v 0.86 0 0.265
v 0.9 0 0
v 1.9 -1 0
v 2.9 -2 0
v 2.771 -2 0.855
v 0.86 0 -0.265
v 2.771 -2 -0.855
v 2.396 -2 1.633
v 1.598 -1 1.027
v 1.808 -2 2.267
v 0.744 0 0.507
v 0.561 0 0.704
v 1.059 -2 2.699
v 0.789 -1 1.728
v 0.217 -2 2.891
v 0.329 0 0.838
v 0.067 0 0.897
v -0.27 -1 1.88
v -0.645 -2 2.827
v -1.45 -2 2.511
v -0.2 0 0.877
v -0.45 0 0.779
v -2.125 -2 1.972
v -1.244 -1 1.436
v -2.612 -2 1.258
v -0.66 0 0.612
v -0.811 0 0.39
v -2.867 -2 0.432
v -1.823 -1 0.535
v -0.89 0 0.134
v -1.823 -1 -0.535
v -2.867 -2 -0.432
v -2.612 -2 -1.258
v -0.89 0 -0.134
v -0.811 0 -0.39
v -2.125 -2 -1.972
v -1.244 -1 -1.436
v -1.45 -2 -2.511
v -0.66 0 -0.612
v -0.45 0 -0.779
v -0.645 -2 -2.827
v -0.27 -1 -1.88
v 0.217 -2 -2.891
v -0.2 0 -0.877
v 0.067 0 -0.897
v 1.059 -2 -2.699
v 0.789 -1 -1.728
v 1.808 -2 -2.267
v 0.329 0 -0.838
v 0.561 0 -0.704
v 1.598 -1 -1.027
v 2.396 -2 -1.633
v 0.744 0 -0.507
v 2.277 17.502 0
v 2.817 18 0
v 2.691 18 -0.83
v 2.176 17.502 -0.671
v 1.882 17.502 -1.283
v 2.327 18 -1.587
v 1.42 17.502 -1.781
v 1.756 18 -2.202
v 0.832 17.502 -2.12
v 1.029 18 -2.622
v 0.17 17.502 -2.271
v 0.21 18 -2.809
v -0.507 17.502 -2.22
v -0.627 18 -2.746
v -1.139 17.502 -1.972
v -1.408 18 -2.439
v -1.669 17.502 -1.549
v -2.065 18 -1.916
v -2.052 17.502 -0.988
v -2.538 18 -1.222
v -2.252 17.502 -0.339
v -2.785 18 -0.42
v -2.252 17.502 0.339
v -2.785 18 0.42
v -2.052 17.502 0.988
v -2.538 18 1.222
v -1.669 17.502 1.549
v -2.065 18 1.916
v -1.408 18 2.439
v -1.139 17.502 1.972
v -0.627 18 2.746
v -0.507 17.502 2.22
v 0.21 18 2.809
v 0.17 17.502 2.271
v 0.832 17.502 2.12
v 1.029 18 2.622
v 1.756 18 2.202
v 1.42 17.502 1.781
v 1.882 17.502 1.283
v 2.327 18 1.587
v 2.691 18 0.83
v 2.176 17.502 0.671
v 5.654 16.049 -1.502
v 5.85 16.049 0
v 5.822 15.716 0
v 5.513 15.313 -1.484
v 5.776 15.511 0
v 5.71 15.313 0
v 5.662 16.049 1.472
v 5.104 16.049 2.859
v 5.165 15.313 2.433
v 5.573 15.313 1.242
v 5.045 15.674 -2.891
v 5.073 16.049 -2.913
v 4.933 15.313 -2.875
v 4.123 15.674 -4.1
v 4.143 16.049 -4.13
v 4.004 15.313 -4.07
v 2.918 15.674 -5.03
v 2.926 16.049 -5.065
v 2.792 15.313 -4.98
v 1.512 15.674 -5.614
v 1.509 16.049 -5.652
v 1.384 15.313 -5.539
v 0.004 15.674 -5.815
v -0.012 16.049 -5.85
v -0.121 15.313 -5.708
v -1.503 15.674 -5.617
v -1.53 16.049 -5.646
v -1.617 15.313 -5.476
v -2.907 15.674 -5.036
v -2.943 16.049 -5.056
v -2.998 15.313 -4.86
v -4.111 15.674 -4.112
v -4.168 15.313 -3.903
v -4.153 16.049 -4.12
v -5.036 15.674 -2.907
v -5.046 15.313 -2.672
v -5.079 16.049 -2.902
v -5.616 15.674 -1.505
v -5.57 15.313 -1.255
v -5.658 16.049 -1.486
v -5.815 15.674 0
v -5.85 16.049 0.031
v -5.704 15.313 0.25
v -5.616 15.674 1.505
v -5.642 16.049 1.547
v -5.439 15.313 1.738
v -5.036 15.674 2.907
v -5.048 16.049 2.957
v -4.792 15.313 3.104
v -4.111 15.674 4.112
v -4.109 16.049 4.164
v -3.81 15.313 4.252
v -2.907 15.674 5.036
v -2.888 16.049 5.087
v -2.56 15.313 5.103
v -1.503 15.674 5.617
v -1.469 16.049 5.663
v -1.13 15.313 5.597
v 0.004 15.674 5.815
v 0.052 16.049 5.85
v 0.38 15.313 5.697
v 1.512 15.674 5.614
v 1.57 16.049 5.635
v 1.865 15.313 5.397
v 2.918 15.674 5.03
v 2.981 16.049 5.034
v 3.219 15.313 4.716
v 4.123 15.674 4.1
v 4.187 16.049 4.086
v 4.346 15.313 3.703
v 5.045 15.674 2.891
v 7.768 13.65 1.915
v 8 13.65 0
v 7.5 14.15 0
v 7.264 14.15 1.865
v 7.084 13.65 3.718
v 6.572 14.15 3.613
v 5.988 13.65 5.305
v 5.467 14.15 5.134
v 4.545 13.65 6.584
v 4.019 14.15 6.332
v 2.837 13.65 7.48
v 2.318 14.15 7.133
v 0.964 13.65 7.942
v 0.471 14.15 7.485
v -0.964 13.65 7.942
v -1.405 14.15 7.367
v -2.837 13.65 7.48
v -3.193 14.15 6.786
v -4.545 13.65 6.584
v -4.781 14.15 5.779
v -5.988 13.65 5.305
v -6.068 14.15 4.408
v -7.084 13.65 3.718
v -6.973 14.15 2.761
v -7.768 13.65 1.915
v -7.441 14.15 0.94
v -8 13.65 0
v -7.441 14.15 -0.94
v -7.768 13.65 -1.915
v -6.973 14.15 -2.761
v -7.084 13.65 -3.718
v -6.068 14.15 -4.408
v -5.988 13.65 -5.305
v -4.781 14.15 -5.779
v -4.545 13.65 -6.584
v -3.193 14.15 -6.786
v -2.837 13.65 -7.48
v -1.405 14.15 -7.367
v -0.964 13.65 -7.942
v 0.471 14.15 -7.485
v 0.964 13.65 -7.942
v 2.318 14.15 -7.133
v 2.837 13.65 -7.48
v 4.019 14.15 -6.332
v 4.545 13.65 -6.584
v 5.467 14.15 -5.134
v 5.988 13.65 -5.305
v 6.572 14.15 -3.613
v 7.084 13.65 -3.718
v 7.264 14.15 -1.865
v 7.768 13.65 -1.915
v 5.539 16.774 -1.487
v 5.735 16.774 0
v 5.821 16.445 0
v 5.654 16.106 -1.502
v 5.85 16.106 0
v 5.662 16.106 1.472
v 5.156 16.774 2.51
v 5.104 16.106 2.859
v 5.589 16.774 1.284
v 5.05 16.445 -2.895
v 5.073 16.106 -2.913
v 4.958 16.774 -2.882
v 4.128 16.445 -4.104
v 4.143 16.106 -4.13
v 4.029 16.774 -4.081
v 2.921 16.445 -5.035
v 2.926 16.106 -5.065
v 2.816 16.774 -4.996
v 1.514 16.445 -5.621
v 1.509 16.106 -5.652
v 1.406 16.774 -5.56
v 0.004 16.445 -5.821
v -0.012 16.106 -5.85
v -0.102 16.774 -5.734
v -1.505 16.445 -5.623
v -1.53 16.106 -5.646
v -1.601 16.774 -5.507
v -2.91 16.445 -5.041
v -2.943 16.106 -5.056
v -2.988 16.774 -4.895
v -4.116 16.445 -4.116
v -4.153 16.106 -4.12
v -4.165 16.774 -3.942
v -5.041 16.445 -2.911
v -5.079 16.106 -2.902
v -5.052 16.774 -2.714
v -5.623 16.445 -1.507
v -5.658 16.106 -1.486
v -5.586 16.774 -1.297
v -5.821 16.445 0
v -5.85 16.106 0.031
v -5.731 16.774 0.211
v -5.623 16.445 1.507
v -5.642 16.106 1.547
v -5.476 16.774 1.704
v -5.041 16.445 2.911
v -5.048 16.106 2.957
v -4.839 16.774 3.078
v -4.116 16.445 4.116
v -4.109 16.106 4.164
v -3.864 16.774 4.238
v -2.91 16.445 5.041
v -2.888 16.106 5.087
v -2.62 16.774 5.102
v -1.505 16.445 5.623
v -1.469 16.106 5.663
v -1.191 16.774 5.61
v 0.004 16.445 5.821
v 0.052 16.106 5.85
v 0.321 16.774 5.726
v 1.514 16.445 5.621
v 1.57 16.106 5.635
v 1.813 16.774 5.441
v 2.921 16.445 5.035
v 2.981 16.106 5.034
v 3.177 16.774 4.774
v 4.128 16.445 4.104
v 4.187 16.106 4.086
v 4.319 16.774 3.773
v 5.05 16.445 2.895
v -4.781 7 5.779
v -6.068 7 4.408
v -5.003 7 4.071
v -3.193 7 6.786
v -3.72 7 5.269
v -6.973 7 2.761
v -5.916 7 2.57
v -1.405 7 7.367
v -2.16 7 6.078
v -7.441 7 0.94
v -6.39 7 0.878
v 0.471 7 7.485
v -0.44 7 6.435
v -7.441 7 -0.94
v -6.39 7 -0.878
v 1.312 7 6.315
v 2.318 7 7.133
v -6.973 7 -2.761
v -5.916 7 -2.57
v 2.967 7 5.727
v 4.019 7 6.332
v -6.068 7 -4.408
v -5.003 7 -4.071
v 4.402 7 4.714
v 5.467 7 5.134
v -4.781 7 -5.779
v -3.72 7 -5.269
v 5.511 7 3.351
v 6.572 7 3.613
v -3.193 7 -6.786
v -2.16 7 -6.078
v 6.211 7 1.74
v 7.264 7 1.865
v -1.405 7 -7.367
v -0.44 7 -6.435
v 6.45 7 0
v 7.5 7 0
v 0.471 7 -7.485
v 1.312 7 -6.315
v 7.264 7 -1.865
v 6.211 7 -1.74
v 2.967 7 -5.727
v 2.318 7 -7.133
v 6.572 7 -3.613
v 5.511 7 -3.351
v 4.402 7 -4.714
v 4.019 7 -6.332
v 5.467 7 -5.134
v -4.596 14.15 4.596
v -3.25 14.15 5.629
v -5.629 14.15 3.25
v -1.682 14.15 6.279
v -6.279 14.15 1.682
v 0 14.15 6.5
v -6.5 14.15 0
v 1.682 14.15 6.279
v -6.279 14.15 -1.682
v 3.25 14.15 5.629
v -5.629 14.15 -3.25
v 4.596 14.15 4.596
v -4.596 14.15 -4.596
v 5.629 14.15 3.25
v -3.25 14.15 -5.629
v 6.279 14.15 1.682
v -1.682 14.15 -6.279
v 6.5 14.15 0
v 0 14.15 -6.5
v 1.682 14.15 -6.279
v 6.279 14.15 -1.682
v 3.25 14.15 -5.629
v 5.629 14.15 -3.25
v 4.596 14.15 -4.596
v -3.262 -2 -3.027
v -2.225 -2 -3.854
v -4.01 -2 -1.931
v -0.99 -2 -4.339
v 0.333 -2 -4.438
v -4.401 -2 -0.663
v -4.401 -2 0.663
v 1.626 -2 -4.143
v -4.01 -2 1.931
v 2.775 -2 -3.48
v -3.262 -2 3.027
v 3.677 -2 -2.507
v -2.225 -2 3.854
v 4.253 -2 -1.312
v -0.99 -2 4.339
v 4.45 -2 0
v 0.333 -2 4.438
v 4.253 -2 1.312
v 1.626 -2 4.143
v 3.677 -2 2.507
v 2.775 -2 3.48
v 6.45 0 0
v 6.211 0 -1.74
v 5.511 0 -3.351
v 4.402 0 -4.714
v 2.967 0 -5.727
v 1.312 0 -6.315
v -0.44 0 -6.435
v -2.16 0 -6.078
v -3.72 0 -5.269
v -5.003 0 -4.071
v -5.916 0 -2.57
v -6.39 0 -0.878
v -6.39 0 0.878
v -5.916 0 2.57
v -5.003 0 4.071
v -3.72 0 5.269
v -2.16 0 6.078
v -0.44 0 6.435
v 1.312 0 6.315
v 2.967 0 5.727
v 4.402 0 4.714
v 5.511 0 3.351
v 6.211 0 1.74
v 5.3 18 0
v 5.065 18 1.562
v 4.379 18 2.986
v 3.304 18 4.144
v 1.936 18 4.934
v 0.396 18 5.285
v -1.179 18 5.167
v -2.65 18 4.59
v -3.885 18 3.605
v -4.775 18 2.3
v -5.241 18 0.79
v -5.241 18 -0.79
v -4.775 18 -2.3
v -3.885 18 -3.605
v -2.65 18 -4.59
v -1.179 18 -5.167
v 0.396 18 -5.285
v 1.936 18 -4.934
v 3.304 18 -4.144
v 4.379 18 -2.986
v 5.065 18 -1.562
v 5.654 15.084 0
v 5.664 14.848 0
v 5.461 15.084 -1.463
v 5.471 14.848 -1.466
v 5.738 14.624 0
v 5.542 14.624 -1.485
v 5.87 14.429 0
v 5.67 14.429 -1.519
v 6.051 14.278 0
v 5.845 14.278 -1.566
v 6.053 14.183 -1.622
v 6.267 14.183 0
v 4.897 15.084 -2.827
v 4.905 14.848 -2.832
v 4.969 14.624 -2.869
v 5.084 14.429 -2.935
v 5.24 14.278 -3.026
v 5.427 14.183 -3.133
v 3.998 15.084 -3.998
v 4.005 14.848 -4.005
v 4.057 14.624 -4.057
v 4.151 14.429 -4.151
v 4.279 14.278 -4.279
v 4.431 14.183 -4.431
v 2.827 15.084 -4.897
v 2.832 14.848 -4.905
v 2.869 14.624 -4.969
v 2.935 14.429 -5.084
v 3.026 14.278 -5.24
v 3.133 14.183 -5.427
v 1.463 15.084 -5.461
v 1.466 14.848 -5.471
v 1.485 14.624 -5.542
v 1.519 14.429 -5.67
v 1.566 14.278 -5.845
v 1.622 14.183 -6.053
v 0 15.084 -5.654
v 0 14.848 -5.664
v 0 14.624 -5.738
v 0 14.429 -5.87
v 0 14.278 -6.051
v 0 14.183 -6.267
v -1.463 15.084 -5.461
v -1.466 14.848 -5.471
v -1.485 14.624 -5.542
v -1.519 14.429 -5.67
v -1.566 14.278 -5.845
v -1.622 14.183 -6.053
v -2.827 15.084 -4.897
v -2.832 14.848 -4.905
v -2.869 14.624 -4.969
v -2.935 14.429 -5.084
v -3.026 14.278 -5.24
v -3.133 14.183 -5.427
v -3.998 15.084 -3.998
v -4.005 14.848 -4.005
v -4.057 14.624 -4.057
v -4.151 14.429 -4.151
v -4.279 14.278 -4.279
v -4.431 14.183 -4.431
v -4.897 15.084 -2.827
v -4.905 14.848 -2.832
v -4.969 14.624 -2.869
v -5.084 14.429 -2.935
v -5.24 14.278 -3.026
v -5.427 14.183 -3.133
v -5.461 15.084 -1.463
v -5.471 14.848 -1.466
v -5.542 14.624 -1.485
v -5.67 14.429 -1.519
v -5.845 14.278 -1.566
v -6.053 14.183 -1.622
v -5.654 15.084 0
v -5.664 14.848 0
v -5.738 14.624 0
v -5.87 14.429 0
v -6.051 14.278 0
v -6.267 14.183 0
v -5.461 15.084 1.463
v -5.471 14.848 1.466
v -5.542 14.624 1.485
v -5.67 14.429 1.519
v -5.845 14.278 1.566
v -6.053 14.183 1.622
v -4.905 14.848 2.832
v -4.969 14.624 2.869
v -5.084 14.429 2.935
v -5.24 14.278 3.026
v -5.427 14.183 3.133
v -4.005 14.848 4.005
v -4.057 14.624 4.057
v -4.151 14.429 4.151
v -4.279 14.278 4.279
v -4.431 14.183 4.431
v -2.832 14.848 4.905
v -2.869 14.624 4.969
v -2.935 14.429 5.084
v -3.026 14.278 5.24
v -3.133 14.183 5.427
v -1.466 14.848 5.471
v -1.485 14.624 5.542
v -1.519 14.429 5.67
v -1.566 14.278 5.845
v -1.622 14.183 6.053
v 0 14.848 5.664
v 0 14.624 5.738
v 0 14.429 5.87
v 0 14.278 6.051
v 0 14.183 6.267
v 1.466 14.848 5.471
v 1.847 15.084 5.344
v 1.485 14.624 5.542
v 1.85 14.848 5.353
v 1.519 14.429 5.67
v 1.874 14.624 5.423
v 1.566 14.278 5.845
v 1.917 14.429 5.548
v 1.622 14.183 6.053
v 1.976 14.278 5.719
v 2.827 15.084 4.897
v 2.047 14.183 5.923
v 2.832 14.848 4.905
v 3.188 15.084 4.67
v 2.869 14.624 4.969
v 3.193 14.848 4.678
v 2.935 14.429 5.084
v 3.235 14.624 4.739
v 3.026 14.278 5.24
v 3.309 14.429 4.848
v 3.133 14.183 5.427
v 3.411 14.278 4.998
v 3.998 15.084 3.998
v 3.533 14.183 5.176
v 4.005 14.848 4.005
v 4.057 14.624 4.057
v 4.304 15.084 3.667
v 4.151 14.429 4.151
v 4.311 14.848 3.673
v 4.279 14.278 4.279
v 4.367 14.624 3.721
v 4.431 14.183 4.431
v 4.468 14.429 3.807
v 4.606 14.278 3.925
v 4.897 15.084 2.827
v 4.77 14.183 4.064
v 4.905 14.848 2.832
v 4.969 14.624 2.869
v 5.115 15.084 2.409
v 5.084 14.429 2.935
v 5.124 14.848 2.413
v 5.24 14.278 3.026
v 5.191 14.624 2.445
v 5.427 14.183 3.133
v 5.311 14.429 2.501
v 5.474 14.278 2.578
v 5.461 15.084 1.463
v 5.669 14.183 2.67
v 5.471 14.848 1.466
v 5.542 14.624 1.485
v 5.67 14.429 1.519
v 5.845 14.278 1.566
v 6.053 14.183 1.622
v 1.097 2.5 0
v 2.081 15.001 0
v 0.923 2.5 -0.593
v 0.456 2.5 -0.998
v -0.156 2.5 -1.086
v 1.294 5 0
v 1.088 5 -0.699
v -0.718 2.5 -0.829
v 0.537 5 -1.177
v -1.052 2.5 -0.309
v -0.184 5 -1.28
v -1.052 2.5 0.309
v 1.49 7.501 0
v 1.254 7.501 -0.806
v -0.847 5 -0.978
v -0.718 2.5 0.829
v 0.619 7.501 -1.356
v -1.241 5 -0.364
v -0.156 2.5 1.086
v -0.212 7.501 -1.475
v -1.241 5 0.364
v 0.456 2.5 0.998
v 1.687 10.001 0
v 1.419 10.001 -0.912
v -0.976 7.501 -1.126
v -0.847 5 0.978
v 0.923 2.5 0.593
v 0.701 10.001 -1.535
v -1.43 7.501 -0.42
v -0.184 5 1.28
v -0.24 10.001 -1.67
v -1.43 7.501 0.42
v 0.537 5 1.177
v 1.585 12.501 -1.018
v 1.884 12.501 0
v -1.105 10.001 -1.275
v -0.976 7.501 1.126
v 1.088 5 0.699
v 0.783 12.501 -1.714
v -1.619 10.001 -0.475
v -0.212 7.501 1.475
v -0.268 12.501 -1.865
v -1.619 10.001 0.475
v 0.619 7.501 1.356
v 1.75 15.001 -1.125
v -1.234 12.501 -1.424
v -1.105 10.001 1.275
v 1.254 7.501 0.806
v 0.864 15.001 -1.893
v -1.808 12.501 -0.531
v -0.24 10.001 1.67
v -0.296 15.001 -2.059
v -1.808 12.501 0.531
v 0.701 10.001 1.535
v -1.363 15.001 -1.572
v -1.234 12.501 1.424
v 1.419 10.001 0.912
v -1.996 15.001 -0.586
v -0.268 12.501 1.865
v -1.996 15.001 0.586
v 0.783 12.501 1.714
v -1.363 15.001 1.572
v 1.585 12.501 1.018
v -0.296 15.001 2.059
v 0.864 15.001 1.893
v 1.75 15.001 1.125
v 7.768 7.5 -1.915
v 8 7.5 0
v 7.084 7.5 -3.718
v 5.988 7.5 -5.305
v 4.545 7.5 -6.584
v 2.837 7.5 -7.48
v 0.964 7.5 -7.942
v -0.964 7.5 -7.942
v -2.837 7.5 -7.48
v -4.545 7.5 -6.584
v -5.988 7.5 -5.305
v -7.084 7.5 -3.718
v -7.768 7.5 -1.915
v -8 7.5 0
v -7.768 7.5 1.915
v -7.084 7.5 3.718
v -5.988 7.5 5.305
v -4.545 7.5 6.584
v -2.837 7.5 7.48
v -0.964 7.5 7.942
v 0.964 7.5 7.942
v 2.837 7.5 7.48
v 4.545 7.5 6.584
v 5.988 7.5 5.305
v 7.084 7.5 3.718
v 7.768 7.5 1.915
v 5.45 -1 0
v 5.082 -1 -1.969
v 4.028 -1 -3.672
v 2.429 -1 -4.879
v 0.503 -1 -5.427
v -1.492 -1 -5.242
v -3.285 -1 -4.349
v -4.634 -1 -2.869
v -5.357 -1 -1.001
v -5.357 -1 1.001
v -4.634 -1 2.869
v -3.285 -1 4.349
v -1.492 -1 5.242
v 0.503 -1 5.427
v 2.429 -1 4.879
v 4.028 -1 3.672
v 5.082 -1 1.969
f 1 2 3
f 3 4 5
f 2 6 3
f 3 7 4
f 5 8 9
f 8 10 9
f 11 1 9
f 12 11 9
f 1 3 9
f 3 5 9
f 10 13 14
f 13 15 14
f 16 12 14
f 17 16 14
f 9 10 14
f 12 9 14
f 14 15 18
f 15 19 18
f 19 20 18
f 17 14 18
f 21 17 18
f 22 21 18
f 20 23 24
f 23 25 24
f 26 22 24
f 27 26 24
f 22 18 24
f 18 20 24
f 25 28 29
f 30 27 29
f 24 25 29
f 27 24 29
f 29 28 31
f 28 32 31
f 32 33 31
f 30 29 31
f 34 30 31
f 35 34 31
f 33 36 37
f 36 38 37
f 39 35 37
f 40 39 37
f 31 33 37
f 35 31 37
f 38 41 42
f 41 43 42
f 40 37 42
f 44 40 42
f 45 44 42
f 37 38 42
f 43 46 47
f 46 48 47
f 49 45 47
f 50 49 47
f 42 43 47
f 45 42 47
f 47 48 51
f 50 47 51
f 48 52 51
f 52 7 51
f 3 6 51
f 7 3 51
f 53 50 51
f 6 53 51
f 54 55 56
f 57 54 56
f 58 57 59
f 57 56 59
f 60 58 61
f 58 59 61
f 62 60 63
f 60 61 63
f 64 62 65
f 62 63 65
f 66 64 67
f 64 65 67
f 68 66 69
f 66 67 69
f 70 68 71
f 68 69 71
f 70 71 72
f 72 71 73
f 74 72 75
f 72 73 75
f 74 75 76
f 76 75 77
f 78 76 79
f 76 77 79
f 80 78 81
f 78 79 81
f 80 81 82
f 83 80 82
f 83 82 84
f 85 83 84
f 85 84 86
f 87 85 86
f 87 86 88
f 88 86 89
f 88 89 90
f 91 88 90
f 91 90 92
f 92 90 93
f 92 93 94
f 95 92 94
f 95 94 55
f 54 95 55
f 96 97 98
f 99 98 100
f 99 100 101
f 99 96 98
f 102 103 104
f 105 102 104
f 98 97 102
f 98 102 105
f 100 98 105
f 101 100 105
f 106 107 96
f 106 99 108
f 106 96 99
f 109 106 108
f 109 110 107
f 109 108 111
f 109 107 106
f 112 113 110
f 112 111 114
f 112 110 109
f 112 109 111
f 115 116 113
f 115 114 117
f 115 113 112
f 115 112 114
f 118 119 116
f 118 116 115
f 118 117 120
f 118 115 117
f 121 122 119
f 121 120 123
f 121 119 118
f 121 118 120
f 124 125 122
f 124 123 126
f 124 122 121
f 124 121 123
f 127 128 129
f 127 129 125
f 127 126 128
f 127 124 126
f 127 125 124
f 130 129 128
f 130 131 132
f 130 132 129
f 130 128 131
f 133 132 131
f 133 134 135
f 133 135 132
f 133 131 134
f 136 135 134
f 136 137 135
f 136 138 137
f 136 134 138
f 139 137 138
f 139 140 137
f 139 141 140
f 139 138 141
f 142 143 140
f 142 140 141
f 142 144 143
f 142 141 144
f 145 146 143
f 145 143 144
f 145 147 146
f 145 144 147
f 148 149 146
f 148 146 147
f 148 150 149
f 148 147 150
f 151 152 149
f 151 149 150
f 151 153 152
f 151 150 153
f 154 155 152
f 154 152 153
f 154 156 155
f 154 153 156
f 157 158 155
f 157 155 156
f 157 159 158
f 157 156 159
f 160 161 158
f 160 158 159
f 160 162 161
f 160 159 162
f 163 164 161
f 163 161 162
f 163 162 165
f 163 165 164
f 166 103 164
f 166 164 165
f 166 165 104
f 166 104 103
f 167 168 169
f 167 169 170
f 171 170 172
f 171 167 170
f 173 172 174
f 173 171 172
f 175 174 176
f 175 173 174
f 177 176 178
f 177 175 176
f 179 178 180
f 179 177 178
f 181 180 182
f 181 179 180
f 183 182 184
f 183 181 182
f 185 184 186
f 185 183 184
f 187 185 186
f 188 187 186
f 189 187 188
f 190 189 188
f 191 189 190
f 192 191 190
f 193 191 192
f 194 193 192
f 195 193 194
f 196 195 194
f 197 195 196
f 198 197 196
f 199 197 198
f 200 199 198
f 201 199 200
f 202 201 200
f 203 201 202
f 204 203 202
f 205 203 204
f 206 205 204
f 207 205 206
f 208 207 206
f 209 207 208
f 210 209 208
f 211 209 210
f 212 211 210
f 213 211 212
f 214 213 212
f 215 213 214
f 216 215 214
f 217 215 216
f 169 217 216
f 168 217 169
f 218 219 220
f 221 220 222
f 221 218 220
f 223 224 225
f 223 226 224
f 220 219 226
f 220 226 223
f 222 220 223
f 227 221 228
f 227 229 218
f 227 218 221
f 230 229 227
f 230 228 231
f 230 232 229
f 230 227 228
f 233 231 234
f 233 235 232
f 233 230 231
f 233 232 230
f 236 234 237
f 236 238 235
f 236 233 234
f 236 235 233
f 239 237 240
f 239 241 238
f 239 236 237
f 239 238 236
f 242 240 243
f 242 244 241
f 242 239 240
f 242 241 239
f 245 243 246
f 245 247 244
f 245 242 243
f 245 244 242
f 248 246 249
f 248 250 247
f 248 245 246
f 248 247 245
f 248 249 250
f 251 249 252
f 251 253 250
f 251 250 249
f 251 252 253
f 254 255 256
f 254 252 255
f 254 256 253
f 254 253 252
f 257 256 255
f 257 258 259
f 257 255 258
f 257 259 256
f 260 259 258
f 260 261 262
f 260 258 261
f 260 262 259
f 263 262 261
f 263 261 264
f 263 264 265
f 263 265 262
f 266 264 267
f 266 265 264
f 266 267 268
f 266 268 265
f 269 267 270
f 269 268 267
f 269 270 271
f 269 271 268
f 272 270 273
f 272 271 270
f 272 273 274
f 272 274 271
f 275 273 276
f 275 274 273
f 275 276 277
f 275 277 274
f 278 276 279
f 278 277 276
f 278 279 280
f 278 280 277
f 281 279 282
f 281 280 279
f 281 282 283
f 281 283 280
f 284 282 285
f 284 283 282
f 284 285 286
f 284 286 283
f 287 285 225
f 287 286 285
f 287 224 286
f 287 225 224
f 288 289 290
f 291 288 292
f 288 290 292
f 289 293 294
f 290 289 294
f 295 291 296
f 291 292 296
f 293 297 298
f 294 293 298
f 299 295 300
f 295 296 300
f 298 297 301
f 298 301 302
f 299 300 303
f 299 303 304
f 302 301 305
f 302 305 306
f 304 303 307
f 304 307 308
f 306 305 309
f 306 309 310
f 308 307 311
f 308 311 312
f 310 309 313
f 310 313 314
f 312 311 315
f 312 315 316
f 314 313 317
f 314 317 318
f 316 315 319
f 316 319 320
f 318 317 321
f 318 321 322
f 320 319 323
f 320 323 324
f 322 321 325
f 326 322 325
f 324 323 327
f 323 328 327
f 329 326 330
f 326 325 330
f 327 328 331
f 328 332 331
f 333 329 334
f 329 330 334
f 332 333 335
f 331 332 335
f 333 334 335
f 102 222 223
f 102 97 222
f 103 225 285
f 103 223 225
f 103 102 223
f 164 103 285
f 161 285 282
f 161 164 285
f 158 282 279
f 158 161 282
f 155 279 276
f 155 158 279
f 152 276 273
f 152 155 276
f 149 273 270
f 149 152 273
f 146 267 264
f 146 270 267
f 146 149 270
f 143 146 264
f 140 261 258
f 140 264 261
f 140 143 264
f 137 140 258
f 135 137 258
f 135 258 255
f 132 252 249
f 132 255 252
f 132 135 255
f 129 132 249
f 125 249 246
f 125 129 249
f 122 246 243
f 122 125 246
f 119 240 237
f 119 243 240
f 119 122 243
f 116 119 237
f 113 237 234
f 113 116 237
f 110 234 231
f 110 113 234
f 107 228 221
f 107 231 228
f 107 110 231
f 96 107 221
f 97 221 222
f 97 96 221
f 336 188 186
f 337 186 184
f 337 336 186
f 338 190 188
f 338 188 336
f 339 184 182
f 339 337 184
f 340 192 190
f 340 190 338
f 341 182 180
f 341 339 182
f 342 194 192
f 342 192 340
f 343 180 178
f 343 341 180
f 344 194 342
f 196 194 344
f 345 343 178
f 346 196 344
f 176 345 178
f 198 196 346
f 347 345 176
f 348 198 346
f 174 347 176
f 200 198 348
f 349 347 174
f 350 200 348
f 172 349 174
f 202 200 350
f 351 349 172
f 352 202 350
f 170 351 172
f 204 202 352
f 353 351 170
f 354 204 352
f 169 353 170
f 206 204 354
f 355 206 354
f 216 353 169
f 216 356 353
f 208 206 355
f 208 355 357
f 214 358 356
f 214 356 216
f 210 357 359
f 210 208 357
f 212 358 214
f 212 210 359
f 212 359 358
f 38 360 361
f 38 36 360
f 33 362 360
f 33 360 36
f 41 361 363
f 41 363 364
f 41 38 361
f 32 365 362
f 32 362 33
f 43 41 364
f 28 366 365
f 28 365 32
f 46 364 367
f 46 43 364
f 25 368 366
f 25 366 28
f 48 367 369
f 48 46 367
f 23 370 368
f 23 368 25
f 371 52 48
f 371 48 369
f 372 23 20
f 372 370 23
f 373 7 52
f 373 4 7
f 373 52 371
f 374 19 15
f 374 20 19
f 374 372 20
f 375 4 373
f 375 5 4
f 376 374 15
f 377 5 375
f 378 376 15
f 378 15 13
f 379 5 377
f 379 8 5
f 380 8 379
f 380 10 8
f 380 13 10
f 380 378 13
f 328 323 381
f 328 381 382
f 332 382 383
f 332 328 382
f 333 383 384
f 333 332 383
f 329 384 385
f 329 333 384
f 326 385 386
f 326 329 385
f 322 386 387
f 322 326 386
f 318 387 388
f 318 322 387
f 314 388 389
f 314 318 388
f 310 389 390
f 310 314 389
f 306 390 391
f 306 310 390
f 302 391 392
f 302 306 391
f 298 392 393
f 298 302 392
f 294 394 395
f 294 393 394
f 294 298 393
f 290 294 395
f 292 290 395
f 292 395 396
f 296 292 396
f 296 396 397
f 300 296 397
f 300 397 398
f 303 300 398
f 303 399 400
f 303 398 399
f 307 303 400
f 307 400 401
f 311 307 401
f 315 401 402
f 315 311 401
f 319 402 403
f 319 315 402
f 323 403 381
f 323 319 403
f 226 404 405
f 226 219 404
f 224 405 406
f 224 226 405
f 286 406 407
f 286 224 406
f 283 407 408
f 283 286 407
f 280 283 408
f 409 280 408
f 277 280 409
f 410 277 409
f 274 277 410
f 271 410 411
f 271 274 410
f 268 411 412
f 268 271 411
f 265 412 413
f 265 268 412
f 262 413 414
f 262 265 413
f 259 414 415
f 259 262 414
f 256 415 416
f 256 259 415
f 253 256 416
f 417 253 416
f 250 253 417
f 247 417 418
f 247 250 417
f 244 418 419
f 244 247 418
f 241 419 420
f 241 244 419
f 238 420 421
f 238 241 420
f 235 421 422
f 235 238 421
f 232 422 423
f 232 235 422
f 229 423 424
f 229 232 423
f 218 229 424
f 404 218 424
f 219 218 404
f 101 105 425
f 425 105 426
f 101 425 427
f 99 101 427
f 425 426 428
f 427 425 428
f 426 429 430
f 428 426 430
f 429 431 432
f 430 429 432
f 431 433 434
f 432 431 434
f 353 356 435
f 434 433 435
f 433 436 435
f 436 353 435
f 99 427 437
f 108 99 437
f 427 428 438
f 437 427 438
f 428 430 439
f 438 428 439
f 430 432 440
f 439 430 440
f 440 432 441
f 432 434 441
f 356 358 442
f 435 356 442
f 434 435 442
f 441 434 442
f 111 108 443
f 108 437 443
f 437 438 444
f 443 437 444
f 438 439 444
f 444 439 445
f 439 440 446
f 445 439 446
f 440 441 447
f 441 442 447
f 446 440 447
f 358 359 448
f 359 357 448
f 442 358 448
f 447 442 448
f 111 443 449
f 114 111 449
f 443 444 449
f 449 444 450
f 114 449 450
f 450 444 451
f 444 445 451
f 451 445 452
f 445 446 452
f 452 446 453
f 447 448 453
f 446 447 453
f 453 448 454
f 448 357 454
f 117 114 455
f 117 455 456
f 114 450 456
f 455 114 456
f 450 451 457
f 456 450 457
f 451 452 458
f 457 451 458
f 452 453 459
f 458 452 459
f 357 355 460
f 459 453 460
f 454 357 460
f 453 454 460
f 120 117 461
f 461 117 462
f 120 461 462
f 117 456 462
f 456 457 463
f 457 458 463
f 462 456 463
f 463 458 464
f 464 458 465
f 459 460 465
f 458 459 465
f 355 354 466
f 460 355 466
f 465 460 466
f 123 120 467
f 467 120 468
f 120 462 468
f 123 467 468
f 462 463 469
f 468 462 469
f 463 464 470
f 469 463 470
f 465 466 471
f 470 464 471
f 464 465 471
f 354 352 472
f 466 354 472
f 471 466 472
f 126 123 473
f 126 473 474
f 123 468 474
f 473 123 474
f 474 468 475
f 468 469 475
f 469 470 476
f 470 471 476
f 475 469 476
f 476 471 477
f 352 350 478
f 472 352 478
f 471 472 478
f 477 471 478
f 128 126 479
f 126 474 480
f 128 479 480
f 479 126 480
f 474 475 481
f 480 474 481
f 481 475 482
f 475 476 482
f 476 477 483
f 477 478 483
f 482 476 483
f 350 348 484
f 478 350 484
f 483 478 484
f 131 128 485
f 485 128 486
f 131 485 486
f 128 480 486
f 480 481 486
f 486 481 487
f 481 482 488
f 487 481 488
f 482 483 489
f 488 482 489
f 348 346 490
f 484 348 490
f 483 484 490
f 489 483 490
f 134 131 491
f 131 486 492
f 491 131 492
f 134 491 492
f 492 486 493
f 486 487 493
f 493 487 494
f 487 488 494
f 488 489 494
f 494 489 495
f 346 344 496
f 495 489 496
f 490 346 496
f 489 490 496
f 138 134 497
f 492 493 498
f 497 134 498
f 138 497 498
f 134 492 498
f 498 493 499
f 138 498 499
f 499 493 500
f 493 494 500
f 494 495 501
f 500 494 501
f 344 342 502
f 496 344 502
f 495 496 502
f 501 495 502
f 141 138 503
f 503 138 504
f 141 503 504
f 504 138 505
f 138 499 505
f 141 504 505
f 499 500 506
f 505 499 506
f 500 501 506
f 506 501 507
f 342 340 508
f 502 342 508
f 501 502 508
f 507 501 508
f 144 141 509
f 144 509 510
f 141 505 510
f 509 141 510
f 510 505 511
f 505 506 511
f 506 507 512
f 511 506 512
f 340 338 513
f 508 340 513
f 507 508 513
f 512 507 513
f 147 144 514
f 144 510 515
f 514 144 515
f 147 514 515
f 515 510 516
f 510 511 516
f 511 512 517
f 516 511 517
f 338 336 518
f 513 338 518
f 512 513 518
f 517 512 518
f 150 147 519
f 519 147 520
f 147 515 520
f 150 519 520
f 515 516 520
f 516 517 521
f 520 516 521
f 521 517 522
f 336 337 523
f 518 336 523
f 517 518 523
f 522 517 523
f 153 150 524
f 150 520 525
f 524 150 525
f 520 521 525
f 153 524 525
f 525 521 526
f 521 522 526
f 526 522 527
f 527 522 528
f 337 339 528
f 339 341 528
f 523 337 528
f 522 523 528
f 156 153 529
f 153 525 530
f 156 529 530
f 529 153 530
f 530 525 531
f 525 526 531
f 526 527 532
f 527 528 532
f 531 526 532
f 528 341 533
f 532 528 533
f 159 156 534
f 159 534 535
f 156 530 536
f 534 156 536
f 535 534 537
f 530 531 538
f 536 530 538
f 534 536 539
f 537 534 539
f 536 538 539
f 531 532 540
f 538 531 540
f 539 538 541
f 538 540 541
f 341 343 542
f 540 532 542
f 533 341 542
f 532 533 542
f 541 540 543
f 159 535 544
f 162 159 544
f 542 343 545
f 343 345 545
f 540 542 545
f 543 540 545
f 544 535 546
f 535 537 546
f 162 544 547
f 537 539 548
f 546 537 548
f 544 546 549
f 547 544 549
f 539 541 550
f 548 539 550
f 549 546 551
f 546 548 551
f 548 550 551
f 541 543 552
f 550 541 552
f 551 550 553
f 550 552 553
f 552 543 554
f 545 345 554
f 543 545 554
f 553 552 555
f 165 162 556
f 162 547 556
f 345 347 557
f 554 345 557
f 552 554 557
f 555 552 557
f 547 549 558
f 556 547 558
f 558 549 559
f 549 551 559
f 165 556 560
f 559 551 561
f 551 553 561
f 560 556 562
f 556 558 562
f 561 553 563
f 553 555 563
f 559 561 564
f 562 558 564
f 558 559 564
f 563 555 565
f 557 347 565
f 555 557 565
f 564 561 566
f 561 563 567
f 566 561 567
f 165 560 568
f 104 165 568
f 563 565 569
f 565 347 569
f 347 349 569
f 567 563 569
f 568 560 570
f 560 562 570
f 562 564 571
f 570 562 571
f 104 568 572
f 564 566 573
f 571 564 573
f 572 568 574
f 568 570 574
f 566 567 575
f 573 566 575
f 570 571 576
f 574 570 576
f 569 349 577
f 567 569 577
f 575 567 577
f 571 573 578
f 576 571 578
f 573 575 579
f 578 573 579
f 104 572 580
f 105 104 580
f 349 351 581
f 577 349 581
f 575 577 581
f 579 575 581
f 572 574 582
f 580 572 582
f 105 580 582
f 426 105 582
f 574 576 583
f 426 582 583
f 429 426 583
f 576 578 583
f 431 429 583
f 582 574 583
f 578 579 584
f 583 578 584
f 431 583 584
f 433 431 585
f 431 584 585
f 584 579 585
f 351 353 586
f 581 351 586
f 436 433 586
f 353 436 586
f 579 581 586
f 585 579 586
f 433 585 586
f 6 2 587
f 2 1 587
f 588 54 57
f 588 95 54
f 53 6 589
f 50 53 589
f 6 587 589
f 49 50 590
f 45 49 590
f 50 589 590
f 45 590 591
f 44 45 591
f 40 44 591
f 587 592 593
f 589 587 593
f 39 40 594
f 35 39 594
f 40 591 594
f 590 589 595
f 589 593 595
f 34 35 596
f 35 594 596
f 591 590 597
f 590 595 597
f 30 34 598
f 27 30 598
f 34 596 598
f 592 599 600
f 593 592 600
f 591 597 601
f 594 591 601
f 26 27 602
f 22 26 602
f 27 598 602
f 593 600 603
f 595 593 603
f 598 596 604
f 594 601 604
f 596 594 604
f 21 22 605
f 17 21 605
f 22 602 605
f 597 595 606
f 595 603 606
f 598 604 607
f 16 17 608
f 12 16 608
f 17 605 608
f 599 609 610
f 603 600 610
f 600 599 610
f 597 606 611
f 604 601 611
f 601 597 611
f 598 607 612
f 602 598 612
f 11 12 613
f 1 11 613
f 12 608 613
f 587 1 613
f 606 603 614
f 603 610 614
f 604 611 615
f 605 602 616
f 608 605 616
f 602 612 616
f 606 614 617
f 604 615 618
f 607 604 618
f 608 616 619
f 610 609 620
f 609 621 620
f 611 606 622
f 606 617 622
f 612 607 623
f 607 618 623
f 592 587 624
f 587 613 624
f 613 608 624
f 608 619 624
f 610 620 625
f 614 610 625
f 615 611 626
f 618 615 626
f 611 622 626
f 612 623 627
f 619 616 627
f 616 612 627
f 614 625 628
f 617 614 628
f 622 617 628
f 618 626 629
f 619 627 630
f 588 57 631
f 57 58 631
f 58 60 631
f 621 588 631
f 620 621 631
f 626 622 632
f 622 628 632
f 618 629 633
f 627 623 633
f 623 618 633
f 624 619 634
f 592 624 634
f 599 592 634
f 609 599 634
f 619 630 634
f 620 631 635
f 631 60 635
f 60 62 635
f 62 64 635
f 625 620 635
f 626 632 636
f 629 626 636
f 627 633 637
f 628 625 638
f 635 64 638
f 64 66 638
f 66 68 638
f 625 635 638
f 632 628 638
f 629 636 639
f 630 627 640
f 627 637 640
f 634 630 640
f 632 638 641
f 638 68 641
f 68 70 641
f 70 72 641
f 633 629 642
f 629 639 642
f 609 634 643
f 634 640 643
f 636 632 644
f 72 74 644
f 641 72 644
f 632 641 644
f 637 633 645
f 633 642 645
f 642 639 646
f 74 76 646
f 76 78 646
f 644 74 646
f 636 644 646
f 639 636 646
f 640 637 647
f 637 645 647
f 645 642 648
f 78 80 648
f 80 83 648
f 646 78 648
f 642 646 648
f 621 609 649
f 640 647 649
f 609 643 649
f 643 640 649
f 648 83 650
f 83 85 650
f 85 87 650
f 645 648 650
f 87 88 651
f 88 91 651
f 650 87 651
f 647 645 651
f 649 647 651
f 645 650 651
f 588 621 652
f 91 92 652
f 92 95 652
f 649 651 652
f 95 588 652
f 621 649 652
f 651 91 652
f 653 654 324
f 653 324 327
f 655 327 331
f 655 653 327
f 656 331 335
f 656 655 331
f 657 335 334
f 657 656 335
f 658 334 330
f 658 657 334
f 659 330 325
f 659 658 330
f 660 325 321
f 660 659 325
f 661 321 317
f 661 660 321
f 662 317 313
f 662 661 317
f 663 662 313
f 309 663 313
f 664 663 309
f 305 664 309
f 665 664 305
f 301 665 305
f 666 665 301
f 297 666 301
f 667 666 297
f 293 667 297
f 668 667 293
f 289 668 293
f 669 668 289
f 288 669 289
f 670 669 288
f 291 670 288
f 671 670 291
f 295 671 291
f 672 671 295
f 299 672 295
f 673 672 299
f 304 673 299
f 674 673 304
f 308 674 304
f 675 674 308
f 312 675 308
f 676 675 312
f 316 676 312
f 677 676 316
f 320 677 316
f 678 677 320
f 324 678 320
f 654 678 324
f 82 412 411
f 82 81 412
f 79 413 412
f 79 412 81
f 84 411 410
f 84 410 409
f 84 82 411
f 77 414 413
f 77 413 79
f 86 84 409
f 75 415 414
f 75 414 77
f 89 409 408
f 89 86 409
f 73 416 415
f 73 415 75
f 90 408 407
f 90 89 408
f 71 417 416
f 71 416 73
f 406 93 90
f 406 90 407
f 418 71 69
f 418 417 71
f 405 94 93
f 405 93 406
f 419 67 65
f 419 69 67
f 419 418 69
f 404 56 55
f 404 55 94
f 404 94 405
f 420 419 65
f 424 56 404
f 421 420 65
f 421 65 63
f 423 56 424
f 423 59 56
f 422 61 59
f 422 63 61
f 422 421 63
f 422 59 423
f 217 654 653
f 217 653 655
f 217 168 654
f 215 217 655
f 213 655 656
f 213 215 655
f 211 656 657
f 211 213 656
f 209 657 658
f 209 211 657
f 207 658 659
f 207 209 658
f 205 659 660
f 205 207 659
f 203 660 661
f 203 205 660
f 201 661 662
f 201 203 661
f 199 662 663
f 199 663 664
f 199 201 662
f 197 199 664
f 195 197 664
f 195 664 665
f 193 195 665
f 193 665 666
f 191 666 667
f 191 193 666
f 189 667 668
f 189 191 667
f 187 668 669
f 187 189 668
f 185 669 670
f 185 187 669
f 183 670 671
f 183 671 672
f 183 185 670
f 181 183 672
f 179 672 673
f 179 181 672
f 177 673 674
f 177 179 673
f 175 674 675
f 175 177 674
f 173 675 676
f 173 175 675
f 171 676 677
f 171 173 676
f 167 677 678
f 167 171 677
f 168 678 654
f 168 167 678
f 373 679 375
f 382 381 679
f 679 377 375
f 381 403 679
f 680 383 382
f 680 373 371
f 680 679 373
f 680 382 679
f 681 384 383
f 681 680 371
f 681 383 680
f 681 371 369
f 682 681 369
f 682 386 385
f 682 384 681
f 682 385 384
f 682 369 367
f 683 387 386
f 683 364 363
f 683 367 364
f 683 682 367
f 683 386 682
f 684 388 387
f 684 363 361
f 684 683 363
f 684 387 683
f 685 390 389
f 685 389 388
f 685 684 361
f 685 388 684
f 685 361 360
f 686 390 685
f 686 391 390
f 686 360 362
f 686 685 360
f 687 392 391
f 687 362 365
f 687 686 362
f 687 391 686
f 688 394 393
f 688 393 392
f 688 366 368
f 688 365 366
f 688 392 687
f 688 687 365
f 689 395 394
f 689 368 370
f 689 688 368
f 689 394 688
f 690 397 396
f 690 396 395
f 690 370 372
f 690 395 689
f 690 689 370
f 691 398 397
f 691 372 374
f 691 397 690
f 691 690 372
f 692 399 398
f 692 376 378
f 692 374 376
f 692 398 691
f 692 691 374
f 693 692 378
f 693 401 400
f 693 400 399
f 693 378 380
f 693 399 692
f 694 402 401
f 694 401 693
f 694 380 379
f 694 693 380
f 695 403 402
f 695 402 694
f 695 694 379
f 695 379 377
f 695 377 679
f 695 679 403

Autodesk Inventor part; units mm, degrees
ref_plane "YZ Plane" through (0, 0, 0) normal (1, 0, 0) x (0, 1, 0)
ref_plane "XZ Plane" through (0, 0, 0) normal (0, 1, 0) x (-1, 0, 0)
ref_plane "XY Plane" through (0, 0, 0) normal (0, 0, 1) x (1, 0, 0)
sketch "Sketch1" plane through (0, 0, 0) normal (0, 0, 1) x (1, 0, 0)
  line L0 (0, 0) -> (0, 8.9988) construction
  line L1 (0, 0) -> (7.1408, 0) construction
  line L2 (0.9, 0) -> (2.3166, 18)
  line L3 (0.9, 0) -> (6.45, 0)
  line L4 (6.45, 0) -> (6.45, 7)
  line L5 (6.45, 7) -> (8, 7)
  line L6 (6.5, 18) -> (2.3166, 18)
  line L7 (6.5, 18) -> (5.85, 18)
  line L8 (5.85, 18) -> (5.85, 15)
  line L9 (5.85, 15) -> (6.5, 15)
  line L10 (6.5, 15) -> (6.5, 18)
  line L11 (5.85, 16.45) -> (5.3, 18)
  circle A0 centre (6.5, 15) radius 0.85
  line L12 (8, 7) -> (8, 14.15)
  line L13 (8, 14.15) -> (6.5, 14.15)
  line L14 (6.5, 14.15) -> (6.5, 15)
  point P0 (5.85, 15.5477)
  point P1 (6.5, 14.15)
  dimension "d0" = 7
  dimension "d1" = 6.45
  dimension "d4" = 18
  dimension "d6" = 4.5
  dimension "d7" = 0.9
  dimension "d9" = 1.7
  dimension "d10" = 3
  dimension "d11" = 0.55
  dimension "d12" = 1.55
  dimension "d18" = 6.5
  dimension "d19" = 0.65
  dimension "d20" = 8
revolve "Revolution1" add sketch "Sketch1" angle 360 about axis through (0, 0, 0) along (0, 1, 0) contours L2 L6 L11 L8 A0 L13 L12 L5 L4 L3
chamfer "Chamfer1" distance 0.5 angle 45 3 edges at (-8, 7, 0) (-2.3166, 18, 0) (-8, 14.15, 0)
fillet "Fillet1" radius 2 2 edges at (-5.85, 15.5477, 0) (-5.85, 16.45, 0)
sketch "Sketch2" plane through (0, 0, 0) normal (0, -1, 0) x (1, 0, 0)
  circle A0 centre (0, 0) radius 6.45 projected
  circle A1 centre (0, 0) radius 0.9 projected
extrude "Extrusion1" add sketch "Sketch2" along normal blind 2
chamfer "Chamfer2" distance 2 angle 45 2 edges at (-0.9, -2, 0) (-6.45, -2, 0)
properties part number "pipettetip_alignmenttool_v2"
